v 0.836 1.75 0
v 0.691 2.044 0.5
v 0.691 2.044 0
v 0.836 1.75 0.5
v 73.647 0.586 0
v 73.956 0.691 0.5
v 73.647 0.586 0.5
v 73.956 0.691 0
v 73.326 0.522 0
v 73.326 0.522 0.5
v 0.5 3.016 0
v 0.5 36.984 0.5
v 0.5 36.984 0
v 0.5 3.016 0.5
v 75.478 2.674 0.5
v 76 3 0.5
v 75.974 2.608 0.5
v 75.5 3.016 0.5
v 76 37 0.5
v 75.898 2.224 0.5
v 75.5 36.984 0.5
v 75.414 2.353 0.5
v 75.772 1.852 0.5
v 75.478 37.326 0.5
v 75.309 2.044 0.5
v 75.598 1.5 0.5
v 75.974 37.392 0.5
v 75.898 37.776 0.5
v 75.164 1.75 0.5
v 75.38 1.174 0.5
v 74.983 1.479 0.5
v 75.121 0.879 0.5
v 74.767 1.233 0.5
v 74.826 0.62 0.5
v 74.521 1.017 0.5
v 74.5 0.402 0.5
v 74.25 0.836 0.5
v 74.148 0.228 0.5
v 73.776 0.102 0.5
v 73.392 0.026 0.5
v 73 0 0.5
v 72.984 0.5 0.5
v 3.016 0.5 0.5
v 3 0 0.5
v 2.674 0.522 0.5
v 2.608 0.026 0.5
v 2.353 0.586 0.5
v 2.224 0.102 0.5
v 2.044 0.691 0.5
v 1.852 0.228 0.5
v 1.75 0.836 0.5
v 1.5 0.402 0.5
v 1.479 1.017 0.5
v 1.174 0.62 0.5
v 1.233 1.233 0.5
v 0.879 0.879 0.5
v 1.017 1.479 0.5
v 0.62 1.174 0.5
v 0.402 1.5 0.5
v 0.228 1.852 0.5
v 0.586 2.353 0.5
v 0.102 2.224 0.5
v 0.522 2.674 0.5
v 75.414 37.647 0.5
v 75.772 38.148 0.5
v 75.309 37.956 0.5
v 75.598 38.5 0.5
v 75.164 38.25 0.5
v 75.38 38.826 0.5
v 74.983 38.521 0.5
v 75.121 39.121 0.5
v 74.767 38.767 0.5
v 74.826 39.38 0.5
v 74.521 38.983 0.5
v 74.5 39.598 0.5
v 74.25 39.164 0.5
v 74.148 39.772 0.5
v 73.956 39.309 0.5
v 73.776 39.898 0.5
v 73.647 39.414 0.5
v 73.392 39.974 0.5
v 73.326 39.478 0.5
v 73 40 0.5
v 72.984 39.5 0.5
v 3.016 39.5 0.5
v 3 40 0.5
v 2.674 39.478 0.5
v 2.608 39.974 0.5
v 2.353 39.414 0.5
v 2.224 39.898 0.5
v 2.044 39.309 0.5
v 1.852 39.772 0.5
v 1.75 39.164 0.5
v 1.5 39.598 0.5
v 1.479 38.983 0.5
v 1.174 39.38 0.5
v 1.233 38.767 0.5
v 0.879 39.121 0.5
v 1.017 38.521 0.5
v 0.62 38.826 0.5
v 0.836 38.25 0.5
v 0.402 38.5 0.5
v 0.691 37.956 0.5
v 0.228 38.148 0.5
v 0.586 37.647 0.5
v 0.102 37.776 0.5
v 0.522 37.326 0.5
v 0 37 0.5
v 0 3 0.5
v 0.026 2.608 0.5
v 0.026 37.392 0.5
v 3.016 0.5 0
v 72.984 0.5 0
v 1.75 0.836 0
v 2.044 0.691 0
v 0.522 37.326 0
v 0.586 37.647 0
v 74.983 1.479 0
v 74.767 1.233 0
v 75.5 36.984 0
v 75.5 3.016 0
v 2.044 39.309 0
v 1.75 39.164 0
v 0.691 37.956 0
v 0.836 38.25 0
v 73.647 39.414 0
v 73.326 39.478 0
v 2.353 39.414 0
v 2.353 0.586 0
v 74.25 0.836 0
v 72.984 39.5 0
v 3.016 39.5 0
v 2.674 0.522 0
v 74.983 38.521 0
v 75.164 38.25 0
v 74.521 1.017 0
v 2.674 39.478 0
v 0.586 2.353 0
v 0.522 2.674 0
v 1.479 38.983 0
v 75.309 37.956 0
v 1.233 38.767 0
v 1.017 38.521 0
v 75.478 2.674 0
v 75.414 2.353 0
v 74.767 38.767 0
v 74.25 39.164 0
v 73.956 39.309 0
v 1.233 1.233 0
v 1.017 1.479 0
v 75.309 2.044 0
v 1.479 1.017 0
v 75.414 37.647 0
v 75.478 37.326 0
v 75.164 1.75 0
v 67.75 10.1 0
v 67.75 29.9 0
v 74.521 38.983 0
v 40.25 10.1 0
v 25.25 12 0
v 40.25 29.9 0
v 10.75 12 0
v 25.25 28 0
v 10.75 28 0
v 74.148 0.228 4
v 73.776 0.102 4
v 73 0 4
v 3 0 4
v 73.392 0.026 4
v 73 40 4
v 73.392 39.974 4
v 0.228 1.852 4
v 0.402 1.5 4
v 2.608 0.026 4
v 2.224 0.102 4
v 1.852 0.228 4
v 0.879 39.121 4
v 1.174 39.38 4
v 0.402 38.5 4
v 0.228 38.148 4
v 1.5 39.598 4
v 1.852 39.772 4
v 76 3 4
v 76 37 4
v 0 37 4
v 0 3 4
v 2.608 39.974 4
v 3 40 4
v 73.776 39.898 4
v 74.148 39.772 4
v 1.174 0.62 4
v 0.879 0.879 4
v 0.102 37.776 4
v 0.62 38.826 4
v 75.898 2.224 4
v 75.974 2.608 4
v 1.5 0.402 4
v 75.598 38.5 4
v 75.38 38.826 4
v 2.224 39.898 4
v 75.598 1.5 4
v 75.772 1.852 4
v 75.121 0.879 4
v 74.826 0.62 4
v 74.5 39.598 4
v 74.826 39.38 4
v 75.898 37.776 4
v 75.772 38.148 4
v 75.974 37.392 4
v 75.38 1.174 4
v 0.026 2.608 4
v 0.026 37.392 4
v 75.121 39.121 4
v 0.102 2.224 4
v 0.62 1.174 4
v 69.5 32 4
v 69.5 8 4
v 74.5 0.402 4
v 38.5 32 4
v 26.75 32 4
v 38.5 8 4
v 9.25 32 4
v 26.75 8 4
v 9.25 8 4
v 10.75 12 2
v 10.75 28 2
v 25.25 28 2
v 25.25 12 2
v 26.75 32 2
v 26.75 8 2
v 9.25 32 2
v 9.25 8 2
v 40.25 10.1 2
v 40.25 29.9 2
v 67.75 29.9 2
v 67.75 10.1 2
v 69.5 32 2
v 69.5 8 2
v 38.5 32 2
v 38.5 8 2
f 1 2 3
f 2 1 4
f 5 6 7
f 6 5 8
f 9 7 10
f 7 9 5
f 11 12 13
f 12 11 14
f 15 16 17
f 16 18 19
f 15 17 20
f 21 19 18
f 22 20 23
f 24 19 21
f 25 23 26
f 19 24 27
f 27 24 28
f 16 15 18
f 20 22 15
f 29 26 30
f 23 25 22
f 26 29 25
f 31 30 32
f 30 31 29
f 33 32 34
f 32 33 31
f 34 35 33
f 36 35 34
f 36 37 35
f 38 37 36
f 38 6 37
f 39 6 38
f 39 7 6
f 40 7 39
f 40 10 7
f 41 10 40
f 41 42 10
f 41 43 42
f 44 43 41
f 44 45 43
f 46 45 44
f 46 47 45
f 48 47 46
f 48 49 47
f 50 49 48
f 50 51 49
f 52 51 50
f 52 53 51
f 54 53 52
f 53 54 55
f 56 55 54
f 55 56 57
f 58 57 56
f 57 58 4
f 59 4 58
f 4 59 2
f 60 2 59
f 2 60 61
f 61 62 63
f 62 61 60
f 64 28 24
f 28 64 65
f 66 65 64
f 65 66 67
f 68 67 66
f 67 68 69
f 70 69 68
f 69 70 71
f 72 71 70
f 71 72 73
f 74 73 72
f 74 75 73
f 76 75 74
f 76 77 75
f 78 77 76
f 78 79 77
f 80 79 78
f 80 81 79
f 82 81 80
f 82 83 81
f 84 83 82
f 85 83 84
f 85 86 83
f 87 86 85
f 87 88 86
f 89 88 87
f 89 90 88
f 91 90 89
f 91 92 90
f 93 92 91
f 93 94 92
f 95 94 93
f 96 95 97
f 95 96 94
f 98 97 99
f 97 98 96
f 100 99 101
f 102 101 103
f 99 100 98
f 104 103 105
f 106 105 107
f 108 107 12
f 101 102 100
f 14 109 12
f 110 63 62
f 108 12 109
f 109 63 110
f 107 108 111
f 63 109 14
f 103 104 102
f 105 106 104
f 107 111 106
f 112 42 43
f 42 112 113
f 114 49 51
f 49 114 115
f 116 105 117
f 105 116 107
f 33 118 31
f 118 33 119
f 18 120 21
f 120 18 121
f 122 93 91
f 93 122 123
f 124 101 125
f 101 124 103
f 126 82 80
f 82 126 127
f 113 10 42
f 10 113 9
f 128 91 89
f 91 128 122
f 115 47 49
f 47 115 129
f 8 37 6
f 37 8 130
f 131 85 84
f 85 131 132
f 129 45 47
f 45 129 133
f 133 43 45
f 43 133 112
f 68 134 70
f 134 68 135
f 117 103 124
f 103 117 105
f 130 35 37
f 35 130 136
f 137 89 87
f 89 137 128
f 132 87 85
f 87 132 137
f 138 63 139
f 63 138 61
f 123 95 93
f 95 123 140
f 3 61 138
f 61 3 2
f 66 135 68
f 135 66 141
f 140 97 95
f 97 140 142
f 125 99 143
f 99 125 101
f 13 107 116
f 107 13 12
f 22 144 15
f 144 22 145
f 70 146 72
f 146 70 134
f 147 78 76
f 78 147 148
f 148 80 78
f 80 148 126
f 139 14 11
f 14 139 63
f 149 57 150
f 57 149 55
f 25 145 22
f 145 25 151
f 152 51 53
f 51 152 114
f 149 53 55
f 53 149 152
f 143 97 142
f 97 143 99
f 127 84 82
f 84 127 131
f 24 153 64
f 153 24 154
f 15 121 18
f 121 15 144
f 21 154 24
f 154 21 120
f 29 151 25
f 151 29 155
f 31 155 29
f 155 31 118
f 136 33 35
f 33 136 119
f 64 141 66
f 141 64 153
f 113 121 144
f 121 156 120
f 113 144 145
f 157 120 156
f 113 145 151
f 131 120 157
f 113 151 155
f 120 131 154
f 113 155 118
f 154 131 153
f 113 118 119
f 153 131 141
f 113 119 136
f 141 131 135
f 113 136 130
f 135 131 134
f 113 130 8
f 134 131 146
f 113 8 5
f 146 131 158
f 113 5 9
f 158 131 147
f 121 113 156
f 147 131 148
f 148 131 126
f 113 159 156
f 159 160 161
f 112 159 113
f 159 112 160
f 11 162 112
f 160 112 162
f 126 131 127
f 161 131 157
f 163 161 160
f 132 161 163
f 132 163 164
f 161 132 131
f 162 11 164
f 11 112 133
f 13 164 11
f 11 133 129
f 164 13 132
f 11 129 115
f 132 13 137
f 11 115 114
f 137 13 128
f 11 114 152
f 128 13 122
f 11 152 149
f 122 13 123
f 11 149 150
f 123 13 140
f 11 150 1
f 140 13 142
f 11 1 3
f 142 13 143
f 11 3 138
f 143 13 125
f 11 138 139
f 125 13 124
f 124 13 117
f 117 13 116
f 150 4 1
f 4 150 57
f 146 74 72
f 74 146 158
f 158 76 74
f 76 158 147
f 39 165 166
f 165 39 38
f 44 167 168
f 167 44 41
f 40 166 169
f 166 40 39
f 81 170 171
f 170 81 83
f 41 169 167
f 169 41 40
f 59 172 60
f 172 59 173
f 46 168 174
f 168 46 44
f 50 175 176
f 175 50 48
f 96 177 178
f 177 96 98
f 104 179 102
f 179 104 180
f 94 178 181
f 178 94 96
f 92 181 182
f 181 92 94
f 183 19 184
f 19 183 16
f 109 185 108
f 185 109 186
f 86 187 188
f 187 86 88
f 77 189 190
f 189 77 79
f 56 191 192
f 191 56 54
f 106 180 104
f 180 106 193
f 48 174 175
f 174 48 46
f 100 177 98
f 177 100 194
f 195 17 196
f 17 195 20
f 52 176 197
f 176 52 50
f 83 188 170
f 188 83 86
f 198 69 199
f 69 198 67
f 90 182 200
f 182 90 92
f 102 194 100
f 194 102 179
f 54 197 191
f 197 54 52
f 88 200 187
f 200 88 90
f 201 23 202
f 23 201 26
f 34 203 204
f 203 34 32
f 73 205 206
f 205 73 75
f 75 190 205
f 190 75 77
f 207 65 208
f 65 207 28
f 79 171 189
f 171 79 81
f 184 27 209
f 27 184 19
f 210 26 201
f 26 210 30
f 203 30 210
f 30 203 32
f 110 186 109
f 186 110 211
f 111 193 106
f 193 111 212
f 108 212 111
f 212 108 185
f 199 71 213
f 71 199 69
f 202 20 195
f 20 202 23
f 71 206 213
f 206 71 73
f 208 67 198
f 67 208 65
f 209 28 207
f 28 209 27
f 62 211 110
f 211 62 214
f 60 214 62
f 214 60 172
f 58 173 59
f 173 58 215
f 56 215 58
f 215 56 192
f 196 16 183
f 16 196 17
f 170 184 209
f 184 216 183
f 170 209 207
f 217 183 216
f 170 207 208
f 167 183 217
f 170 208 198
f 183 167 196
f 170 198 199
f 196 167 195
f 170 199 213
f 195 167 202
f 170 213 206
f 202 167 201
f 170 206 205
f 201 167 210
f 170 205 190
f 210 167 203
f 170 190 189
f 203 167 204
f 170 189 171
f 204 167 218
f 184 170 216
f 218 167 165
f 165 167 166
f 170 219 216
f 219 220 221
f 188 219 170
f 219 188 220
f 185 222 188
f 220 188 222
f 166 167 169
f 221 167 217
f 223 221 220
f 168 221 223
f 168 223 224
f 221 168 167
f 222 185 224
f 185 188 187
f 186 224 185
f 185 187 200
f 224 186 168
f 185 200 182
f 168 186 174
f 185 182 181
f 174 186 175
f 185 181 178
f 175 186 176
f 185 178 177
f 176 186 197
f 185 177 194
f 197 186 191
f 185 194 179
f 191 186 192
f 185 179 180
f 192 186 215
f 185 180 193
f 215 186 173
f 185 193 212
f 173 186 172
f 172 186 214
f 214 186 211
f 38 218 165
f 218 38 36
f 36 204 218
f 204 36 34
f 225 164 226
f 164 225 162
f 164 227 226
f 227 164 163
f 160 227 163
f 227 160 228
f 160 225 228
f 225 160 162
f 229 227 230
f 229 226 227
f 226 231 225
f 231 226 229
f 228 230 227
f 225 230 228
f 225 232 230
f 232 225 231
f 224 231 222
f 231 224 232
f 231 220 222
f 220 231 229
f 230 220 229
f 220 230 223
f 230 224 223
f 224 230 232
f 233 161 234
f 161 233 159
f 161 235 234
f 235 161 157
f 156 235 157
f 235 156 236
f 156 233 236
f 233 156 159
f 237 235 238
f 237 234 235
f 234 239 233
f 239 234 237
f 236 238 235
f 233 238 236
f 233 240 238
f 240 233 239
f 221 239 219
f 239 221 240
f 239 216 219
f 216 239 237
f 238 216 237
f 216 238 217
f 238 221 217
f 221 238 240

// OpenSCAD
// file: params.scad
// ===========================================================================
//  Apache 4800 cyberdeck v2 - shared parameters (all mm)
//  Every part file includes this through parts.scad.
//  Values marked [CHECK] are defaults from the spec: measure the real part and
//  change them here, then run build.cmd again to re-export every STL.
// ===========================================================================

// ---- printer limits --------------------------------------------------------
bed_max    = 175;      // max footprint X and Y
height_max = 150;

// ---- case: Harbor Freight Apache 4800 ---------------------------------------
case_in      = [454, 327];  // interior at the rim (listed)
tray         = [444, 312];  // [CHECK] printed tray outline = floor at the very bottom
tray_r       = 20;          // [CHECK] inside corner radius
base_depth   = 115;         // [CHECK] floor to rim
lid_depth    = 44;          // [CHECK]
height_limit = 100;         // nothing in the base taller than this above the floor

// ---- floor tiles (3 x 2) -----------------------------------------------------
tile_cols = 3;
tile_rows = 2;
tile_t    = 4;
tile_gap  = 0.4;                       // total gap between neighbouring tiles
tile_sz   = [tray[0] / tile_cols, tray[1] / tile_rows];   // 148 x 156
vent_sz     = 15;
vent_pitch  = 25;
vent_margin = 8;                       // keep vents this far from tile edges
chamfer     = 0.5;                     // bottom-edge chamfer (elephant foot)

// ---- tile joints (dovetail tabs printed on the tiles - no loose keys) -------
tab_neck  = 10;      // width where the tab leaves its tile
tab_head  = 16;      // width at the tip (wider = locks)
tab_len   = 10;      // how far it reaches into the next tile
tab_clear = 0.2;     // gap around the tab in the socket (per side); raise if too tight

// ---- Velcro straps ------------------------------------------------------------
strap_w      = 22;   // slot length (20 mm strap + room)
strap_slot_t = 3.5;  // slot width
strap_groove = 1.6;  // groove depth under a floor for the strap (leaves >= 2.4 mm of floor)

// ---- layout (top view; origin = front-left of tray, X right, Y to hinge) ----
// [x0, y0, x1, y1]
hub_box    = [75,   6, 245,  56];
pi_box     = [75,  60, 245, 138];
power_box  = [75, 142, 245, 282];
switch_box = [2.5, 12.5, 72.5, 117.5];
signal_lane = [0, 286, tray[0], 298];
power_lane  = [0, 300, tray[0], 312];

// ---- the PC: Minisforum UM870 Slim (names still say k12 so nothing else breaks) ----
k12      = [130, 126.5, 50.4];    // listed (was GMKtec K12: 154 x 151 x 73.6)
k12_pos  = [266, 40];             // front-left corner on the tray (same spot as the K12)
// [CHECK] open air behind the PC: assumes it blows hot air out the back.
// Once the UM870 is here, check where its vents really are.
rear_air = [k12_pos[0], k12_pos[1] + k12[1], 420, 286];
plinth_margin = 8;
plinth_h      = 15;
plinth_rim    = 8;                // solid border: corner guides sit fully on it
hex_cell      = 10;               // across flats
hex_wall      = 2;
plinth_post_front_h = 20;         // above the honeycomb
plinth_post_rear_h  = 10;         // keep the rear exhaust clear (spec: <= 10)
plinth_post_leg     = 15;
plinth_post_t       = 3;
k12_clear           = 1;
plinth_box = [k12_pos[0] - plinth_margin, k12_pos[1] - plinth_margin,
              k12_pos[0] + k12[0] + plinth_margin, k12_pos[1] + k12[1] + plinth_margin];

// ---- USB hub (Vantisan) -----------------------------------------------------------
hub      = [161, 42, 25];        // measured
hub_fit  = 1;                    // clearance (total)
hub_wall_h       = 16;           // back/side walls above the floor
hub_front_wall_h = 8;            // [CHECK] low front wall: ports face up/front
hub_floor        = 4;
hub_cable_end    = "right";      // cable exit notch end: "right" (toward the PC) or "left"

// ---- Raspberry Pi 5 in CanaKit case ------------------------------------------------
pi_case   = [95, 65, 30];        // measured (height est.)
pi_fit    = 1;
pi_floor  = 4;
pi_guide_h  = 12;
pi_vent_gap = 15;                // open space between Pi and the cable cubby
cubby_wall_h = 15;

// ---- power bay ------------------------------------------------------------------
brick  = [150, 65, 35];          // [CHECK] PC 120 W brick (UM870: 19 V / 6.32 A) - measure it
strip  = [130, 60, 40];          // [CHECK] compact 3-outlet surge strip
power_floor  = 4;
power_wall_h = 30;               // above the floor
power_wall_t = 3;
brick_rib_h  = 4;                // air gap under the brick

// ---- network switch -----------------------------------------------------------------
switch_sz   = [65, 100, 25];     // [CHECK] (X = width, Y = length, ports at back)
switch_fit  = 1;
switch_floor  = 4;
switch_wall_h = 12;

// ---- cable lanes ---------------------------------------------------------------------
rib_h      = 10;
rib_t      = 2.4;
rib_foot_w = 8;
rib_foot_t = 2;
rib_y      = 299;                // centre line between the lanes
comb_w     = 20;                 // comb thickness along the lane

// ---- left-wall side panel -------------------------------------------------------------
panel      = [150, 60];
panel_outer_t = 4;
panel_inner_t = 3;
wall_cutout   = [135, 42];       // [CHECK] must sit inside the flat area of the wall
panel_y_center = 215;            // along the case wall (tray Y)
keystone_hole  = [14.5, 16.0];   // print keystone_test.stl first and adjust
keystone_relief = [17.5, 24];    // back-side pocket so the latch sees a thin plate
keystone_latch_t = 2.0;          // plate thickness where the keystone clips on
keystone_pitch = 19.5;
// Power entry: "iec" = snap-in C14 inlet (recommended - see README) or "slot" = cord slot
power_entry  = "iec";
iec_hole     = [27.5, 19.8];     // [CHECK] snap-in C14 inlet cutout
iec_relief   = [31, 24];
iec_latch_t  = 2.0;
cord_slot    = [25, 12];
m4_hole      = 4.3;
labels = ["LAN", "PC", "MIC", "AUD", "USB", "PWR"];
cover_clear  = 9;                // room in front of the plate for couplers/bolt heads

// ---- lid monitor clips (ViewSonic VA1655) ------------------------------------------------
monitor     = [359, 227];        // listed (spec value used; re-measure the width)
mon_thick   = 20;                // thick edge (measured)
mon_thin    = 10;                // thin edge (measured)
thick_edge  = "bottom";          // [CHECK] "bottom" = hinge side when the lid is open
foam_t      = 1.5;               // foam on every face touching the monitor
clip_wall_t = 3;
clip_lip    = 3;                 // overlap onto the bezel only
clip_lip_t  = 2.5;
clip_buttress = 12;              // VHB foot width outside the wall
clip_leg    = 45;                // leg length along the monitor edge, from the corner
clip_port_leg = 20;              // [CHECK] shorter leg along the RIGHT edge (port zone)

// ---- print settings reference (set these in the slicer) ---------------------------------
// 0.4 nozzle, 0.2 layers, 4 walls, 25-30% gyroid
// holes already include +0.3 mm
$fn = 48;
// main file
// PRINT THIS FIRST: one keystone opening + one power-inlet opening.
include <parts.scad>
keystone_test();
